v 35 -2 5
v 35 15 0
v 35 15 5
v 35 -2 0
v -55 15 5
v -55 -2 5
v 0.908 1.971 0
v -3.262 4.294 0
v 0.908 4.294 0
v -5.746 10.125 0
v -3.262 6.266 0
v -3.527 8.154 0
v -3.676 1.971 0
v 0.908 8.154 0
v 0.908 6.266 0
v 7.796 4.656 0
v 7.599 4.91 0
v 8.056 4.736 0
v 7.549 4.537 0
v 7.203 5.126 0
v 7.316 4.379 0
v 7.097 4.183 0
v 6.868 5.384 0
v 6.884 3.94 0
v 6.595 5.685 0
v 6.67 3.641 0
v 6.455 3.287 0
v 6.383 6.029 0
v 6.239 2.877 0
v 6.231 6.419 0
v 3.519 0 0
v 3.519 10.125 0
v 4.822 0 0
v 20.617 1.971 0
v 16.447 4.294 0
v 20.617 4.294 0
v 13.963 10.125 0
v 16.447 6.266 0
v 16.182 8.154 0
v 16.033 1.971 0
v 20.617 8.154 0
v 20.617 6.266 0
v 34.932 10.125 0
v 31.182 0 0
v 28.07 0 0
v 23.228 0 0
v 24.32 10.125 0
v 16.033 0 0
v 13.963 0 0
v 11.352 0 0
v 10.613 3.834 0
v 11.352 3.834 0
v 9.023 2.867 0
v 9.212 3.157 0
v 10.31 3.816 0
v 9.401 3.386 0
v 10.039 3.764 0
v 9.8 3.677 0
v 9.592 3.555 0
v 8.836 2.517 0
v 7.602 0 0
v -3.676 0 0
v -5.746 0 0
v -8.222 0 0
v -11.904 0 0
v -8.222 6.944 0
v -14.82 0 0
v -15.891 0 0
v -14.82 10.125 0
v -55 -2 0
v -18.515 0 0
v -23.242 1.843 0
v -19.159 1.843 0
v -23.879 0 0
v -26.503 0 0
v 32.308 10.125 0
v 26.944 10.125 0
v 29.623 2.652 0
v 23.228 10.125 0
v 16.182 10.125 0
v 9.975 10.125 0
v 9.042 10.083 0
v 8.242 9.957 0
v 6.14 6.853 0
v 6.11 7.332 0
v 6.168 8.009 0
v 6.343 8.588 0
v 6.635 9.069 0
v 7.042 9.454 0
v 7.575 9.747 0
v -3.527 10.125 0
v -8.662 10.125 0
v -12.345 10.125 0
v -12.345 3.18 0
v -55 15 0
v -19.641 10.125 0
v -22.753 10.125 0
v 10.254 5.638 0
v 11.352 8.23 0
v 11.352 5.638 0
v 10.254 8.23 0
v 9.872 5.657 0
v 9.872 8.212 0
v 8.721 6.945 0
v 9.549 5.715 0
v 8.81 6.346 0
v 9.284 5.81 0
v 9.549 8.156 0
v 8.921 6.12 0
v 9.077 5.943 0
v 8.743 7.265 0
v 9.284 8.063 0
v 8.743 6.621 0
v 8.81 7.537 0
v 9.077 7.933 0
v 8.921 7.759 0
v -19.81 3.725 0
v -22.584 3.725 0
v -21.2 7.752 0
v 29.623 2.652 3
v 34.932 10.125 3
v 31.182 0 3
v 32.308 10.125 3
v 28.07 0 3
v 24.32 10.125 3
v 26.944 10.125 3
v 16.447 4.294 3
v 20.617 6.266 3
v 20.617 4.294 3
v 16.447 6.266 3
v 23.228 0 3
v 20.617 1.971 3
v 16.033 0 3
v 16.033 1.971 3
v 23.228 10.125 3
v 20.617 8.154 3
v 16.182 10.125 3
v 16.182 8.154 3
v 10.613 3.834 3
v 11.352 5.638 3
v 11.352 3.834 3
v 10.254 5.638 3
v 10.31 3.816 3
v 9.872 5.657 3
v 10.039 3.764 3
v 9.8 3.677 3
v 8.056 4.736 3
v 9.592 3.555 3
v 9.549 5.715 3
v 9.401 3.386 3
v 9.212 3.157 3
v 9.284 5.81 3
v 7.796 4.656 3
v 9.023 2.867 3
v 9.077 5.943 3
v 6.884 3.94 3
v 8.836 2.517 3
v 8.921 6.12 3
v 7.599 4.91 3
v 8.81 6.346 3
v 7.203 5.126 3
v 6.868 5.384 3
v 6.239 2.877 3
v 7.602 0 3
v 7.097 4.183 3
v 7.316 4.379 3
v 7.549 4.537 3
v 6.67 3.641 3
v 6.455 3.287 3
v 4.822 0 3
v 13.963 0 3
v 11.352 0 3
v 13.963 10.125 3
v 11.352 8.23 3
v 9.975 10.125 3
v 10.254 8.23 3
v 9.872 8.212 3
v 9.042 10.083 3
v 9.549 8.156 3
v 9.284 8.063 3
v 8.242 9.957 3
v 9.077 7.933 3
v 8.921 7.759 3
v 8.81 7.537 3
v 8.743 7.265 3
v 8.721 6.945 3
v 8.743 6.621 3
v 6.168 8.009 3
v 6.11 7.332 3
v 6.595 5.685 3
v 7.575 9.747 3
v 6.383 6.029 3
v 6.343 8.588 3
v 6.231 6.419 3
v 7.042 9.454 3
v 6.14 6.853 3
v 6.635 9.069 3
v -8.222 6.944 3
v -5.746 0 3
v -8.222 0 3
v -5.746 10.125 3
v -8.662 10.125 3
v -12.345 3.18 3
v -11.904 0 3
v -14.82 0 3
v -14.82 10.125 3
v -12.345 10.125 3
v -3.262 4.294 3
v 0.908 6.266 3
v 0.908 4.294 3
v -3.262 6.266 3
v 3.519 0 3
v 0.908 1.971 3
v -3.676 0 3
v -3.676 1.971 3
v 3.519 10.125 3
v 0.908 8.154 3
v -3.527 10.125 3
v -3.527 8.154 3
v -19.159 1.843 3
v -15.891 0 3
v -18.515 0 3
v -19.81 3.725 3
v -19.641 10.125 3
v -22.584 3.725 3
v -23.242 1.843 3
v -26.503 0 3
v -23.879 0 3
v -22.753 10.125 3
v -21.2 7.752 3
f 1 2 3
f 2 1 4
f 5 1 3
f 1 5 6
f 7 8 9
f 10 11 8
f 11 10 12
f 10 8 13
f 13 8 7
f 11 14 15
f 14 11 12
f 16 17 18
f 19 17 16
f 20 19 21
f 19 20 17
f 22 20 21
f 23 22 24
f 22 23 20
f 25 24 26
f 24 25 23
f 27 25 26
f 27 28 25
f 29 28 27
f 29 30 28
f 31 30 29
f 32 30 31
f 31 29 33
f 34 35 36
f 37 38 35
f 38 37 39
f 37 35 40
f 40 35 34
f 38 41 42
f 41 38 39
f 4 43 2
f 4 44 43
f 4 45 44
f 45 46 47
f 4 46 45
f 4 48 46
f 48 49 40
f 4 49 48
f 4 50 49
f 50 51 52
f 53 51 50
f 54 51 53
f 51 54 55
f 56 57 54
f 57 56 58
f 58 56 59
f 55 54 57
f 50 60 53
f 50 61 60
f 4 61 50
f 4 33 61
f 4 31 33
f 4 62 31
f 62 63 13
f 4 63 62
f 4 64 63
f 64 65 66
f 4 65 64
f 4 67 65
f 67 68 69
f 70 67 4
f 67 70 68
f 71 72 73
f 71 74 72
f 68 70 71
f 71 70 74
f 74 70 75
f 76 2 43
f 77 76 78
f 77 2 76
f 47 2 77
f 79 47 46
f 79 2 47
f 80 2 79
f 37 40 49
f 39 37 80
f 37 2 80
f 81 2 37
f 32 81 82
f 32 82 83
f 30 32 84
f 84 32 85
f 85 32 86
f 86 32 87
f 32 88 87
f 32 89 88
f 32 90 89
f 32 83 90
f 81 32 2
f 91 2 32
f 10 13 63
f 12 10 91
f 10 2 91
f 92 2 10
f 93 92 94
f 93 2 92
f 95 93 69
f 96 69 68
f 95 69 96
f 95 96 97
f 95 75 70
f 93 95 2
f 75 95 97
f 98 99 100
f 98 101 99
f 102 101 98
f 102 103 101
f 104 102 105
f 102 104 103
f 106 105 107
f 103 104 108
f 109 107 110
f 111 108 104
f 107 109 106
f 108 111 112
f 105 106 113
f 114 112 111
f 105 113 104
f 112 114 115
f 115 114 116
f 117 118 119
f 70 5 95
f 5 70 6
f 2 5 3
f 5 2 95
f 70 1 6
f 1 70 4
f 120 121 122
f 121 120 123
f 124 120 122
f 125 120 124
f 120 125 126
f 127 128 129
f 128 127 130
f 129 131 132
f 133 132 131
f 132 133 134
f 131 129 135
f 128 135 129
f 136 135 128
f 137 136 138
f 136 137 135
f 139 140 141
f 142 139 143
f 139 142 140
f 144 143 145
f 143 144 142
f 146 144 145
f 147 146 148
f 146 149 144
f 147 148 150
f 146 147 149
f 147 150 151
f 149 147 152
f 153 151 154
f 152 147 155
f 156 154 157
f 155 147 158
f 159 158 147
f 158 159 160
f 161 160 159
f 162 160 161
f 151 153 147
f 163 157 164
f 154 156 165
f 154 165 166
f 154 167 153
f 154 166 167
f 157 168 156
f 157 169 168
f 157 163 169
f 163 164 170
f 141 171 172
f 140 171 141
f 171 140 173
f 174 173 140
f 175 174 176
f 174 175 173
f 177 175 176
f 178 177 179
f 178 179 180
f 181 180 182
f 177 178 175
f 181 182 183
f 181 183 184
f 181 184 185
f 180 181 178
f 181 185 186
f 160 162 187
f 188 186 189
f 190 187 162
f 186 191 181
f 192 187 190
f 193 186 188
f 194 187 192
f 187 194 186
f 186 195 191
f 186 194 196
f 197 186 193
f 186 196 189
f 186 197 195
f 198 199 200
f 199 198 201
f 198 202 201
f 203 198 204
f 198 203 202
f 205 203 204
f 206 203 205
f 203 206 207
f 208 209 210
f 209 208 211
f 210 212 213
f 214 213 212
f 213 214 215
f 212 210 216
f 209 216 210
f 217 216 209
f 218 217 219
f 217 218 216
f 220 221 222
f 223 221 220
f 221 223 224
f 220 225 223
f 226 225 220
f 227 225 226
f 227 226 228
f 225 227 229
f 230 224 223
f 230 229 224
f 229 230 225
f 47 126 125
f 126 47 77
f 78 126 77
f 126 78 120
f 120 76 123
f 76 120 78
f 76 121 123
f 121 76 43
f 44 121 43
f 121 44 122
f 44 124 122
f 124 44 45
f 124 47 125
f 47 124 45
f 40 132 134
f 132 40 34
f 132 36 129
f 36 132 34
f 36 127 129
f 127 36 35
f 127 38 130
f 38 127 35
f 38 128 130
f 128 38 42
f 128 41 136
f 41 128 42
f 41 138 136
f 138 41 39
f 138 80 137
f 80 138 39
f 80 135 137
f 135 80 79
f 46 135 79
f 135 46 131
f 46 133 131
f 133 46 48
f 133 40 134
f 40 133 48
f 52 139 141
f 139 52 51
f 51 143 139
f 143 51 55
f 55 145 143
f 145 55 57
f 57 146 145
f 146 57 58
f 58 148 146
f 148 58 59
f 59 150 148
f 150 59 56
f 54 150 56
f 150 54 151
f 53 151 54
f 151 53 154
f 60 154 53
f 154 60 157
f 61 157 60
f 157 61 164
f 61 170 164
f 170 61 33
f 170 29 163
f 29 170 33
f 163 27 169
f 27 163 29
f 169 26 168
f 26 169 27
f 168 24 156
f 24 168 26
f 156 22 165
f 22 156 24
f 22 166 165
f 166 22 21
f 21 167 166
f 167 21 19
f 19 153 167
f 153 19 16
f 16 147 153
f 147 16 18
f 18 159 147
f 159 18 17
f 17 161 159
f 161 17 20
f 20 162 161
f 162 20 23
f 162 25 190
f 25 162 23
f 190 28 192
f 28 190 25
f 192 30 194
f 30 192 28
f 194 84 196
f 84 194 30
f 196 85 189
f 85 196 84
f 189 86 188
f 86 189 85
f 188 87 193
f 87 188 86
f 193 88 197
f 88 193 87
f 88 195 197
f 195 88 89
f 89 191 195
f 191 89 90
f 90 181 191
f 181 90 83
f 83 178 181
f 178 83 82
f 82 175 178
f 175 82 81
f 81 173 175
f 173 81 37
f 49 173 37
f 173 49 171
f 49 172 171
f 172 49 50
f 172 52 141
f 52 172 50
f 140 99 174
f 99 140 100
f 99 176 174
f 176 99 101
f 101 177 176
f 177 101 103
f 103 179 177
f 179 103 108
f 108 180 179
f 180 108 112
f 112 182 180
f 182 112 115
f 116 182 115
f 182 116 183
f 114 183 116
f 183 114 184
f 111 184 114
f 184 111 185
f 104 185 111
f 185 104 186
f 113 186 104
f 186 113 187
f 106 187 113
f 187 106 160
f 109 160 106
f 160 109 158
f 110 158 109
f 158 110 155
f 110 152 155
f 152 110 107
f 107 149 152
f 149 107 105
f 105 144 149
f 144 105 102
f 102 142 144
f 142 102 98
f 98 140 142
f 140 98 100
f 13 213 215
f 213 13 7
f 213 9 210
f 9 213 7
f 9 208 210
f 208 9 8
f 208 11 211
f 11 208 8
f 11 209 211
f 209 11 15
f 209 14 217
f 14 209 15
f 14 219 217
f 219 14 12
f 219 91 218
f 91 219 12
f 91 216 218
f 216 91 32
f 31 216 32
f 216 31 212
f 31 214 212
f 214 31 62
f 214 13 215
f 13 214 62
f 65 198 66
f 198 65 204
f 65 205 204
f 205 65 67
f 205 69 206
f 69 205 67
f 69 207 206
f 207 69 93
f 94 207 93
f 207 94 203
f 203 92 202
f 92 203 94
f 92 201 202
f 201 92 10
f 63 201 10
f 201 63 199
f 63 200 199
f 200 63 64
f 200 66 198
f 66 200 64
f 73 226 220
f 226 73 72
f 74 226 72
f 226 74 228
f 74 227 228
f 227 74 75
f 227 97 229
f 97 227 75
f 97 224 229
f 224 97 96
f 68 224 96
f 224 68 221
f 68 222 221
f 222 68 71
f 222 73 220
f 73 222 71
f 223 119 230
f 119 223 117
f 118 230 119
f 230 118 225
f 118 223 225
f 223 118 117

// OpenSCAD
difference() {
    translate([-55,-2,0]){cube([90, 17, 5]);}

    translate([35,0,0]) {
        mirror([1,0,0]){
            linear_extrude(height = 3) {
                text("VERENA", font="Nelson Script:style=Bold", size=8, spacing=1, size=10);
//                            text("Verena", size=8, font="default:style=Bold", spacing=1, size=15);
            }
        }
    }
    
}
